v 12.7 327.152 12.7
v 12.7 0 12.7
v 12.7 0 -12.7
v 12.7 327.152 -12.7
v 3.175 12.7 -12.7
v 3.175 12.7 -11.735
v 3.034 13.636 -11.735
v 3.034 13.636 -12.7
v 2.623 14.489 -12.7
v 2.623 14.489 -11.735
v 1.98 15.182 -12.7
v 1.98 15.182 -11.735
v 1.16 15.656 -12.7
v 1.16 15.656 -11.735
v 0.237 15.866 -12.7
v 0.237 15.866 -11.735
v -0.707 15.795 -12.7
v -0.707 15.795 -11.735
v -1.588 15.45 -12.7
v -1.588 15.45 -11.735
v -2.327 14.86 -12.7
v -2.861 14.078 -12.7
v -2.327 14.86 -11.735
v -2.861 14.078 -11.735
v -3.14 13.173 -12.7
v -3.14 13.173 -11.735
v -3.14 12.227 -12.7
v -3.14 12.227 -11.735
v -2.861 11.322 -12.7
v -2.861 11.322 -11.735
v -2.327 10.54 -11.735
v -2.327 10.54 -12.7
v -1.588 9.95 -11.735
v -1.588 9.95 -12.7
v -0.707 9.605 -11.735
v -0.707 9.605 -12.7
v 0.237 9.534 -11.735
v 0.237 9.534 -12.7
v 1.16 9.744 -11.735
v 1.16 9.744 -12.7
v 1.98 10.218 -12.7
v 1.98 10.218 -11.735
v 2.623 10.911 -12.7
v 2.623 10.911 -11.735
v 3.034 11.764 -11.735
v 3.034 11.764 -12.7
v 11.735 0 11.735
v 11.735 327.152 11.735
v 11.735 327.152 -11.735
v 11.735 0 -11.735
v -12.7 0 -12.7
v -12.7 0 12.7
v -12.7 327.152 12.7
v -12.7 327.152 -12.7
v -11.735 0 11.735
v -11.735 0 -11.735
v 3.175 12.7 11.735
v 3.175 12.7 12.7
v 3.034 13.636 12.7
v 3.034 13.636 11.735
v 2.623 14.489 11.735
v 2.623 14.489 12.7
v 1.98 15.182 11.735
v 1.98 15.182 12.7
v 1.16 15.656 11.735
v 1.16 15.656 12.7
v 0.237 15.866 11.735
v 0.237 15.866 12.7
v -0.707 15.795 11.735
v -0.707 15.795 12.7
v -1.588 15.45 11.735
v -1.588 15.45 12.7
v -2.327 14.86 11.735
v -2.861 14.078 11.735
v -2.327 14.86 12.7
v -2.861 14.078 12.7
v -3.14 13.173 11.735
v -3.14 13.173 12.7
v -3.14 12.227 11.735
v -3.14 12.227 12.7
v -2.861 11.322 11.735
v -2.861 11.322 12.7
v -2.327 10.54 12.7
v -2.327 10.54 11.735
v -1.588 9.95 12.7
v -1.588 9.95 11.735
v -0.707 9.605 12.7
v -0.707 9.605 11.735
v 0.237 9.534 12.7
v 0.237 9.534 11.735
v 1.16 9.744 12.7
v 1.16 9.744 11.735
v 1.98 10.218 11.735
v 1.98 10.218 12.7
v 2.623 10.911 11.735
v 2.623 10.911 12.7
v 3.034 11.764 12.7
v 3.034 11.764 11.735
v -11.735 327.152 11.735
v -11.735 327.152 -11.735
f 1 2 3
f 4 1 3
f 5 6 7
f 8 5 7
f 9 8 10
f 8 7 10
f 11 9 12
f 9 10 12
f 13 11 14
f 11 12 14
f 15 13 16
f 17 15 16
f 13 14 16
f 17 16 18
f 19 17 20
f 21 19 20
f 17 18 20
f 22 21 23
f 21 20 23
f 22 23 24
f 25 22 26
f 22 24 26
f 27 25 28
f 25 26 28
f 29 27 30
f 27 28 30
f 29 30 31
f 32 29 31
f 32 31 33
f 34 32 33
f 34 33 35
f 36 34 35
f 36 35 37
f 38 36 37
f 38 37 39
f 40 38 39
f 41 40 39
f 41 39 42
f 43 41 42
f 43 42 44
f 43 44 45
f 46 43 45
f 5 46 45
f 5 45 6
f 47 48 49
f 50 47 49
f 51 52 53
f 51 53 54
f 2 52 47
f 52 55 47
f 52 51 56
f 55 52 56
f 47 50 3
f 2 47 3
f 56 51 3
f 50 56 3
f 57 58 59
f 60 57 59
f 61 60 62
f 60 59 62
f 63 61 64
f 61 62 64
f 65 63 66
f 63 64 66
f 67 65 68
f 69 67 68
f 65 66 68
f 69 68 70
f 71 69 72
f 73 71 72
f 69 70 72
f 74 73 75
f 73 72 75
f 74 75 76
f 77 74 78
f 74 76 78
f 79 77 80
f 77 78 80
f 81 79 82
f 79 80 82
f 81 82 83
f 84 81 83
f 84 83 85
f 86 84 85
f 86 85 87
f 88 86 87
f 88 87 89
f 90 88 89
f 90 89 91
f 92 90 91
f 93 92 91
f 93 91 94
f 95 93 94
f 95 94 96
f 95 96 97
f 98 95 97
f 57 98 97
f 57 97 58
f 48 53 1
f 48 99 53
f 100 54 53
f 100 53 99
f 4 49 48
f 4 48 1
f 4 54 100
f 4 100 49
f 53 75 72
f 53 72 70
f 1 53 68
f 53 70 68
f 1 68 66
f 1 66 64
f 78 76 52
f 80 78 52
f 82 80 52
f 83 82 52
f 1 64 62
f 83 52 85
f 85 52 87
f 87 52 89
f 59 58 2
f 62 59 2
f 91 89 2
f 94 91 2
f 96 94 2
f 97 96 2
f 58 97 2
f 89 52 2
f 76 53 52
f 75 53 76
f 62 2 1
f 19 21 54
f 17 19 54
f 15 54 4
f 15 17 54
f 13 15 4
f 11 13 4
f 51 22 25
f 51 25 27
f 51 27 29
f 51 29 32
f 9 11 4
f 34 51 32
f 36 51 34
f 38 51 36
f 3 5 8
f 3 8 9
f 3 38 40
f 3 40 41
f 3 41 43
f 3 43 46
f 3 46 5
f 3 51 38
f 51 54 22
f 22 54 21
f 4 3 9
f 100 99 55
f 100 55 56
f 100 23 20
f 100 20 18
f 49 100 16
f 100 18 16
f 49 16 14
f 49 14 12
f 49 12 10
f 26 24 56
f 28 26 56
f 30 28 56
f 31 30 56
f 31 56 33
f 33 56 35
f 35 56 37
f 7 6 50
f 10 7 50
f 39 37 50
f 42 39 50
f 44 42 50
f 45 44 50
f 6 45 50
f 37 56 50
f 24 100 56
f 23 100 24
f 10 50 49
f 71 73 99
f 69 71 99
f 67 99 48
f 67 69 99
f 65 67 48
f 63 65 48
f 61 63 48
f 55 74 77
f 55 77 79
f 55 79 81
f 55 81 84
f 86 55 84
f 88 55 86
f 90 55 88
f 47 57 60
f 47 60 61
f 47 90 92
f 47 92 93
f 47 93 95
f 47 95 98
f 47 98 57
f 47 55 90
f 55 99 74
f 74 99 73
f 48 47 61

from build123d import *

# Parameters (mm, degrees)
SKETCH1_W           = 25.4
SKETCH1_H           = 25.4
SKETCH1_W_2         = 23.4696
SKETCH1_H_2         = 23.4696
BOSS_EXTRUDE1_DEPTH = 327.152
SKETCH3_R           = 3.175
CUT_EXTRUDE1_DEPTH  = 292.1


with BuildPart() as part:
    # Sketch1 → Boss-Extrude1 (new body)
    with BuildSketch(Plane(origin=(0, 0, 0), x_dir=(1, 0, 0), z_dir=(0, 1, 0))):
        Rectangle(SKETCH1_W, SKETCH1_H)
        Rectangle(SKETCH1_W_2, SKETCH1_H_2, mode=Mode.SUBTRACT)
    extrude(amount=BOSS_EXTRUDE1_DEPTH)

    # Sketch3 → Cut-Extrude1 (cut)
    with BuildSketch(Plane.XY.offset(12.7)):
        with Locations((0, 12.7)):
            Circle(SKETCH3_R)
    extrude(amount=-CUT_EXTRUDE1_DEPTH, mode=Mode.SUBTRACT)


solid = part.part
